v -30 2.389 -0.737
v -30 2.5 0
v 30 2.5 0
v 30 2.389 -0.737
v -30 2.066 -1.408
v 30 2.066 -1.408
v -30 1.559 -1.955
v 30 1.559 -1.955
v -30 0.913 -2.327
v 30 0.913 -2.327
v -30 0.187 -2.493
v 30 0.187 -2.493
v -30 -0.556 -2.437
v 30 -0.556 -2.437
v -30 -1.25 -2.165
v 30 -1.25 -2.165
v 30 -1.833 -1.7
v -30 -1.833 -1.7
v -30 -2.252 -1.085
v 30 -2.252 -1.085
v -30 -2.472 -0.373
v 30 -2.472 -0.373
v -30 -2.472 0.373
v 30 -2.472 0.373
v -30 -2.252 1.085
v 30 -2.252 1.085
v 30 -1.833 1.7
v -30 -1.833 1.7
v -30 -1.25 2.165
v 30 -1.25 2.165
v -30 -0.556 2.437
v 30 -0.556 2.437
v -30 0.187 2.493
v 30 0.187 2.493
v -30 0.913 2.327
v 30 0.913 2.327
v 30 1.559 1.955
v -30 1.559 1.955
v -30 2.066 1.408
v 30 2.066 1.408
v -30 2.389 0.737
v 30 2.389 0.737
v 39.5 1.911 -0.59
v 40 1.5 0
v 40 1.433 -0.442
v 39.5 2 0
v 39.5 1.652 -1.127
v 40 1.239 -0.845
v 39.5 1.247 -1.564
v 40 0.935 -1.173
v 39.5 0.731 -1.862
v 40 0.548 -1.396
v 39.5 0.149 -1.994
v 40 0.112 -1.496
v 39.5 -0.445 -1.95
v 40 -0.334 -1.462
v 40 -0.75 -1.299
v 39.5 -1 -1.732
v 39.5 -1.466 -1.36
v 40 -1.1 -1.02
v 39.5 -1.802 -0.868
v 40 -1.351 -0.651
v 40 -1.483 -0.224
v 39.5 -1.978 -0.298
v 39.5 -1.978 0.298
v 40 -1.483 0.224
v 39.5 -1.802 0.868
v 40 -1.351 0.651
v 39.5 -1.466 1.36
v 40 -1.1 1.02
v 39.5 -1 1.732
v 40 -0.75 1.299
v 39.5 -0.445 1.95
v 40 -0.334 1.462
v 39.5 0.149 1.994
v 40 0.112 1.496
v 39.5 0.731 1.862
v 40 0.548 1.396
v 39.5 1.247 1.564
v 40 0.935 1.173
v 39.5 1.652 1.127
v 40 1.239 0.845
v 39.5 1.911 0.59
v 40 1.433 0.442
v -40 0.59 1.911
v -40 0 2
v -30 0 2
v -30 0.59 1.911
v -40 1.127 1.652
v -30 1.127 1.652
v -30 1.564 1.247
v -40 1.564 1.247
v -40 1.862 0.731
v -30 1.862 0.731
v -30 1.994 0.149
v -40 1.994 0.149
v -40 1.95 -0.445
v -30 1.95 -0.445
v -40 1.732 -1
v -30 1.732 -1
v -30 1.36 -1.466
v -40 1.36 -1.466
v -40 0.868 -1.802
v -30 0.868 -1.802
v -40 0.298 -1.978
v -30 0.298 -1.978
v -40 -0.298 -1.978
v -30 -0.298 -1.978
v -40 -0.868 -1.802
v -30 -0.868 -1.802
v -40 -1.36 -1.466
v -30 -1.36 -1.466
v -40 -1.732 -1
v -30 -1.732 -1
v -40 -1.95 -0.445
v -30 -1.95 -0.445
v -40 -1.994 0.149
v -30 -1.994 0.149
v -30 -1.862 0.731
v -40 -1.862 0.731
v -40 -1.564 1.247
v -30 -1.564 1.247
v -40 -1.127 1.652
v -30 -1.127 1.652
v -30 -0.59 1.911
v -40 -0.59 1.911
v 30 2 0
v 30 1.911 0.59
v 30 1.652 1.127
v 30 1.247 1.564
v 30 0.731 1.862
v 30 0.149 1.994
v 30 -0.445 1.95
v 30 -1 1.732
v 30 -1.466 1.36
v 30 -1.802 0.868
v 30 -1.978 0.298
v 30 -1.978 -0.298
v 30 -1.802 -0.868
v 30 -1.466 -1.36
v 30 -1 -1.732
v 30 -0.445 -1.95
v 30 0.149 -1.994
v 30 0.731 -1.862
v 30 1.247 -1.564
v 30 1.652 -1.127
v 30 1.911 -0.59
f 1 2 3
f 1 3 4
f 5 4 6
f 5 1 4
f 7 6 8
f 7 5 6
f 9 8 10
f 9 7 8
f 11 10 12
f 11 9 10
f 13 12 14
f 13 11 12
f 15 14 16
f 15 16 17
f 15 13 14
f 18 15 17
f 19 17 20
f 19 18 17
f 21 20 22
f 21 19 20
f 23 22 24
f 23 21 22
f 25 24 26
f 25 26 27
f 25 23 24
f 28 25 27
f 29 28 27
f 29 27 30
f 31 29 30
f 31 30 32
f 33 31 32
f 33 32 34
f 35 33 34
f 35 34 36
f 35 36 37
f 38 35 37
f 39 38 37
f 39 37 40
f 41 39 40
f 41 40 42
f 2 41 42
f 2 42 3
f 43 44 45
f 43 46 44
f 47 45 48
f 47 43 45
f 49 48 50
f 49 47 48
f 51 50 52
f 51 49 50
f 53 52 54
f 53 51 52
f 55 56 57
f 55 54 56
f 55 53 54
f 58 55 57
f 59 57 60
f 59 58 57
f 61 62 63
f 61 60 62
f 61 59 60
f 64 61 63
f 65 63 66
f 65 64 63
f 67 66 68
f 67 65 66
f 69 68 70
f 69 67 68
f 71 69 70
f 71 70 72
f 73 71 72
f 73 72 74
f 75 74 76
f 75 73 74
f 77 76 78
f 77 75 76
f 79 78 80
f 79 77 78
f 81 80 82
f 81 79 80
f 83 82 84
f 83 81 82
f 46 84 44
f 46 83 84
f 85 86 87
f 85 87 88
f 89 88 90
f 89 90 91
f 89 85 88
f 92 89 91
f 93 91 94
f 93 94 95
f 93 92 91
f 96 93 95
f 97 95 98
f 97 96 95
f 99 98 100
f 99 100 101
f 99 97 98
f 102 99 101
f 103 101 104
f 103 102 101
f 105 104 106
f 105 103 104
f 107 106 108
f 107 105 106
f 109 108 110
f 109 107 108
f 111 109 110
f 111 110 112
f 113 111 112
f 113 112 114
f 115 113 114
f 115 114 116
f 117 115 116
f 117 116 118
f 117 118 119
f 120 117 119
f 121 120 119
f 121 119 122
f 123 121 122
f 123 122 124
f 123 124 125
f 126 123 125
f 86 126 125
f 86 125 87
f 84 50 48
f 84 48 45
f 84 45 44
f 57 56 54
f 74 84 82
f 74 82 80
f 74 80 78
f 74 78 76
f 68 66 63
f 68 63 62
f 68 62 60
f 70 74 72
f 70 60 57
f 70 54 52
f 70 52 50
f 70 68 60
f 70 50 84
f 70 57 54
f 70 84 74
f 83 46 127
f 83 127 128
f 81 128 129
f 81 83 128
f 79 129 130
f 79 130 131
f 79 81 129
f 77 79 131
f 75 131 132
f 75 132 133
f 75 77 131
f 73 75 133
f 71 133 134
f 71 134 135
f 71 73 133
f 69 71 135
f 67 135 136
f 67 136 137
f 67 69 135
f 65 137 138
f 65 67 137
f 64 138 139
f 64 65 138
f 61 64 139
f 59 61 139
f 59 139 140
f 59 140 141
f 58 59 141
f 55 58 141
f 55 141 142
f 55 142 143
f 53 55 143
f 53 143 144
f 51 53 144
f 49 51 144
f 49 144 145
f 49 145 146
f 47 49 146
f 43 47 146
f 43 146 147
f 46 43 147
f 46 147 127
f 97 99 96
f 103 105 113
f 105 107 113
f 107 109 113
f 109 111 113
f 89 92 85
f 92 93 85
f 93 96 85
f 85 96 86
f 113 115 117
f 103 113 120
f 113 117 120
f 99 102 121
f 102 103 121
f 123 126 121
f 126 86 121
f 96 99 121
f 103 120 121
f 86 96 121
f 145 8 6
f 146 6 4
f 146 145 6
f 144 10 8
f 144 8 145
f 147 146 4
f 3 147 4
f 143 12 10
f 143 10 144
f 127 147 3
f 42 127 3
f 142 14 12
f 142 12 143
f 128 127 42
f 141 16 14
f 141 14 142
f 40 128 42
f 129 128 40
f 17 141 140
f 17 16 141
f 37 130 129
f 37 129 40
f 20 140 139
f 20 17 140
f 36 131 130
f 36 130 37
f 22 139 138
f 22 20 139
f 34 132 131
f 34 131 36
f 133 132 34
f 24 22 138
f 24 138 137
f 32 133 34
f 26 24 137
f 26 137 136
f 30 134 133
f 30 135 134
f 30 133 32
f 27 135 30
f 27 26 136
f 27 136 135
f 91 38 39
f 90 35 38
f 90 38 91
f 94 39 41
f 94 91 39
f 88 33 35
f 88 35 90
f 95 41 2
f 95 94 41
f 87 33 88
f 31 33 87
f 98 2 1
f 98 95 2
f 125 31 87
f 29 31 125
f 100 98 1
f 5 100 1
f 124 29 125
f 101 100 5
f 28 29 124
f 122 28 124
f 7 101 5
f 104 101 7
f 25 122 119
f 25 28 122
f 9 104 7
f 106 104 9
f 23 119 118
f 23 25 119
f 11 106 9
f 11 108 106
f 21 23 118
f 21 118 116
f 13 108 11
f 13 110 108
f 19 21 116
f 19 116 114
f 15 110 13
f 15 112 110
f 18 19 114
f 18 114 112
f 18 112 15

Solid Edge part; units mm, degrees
sketch "Sketch1" plane through (0, 0, 0) normal (1, 0, 0) x (0, 1, 0)
  circle A0 centre (0, 0) radius 2.5
  dimension "D1" = 5
extrude "Protrusion1" add sketch "Sketch1" along normal mid plane 80
sketch "Sketch2" plane through (40, 0, 0) normal (1, 0, 0) x (0, 1, 0)
  circle A0 centre (0, 0) radius 2
  dimension "D1" = 4
extrude "Extrusionsausschnitt_1" cut sketch "Sketch2" against normal blind 10 flip side to cut
cosmetic_thread "Thread1" size "M4"
chamfer "Fase_1" distance 0.5 angle 45 1 edges at (40, -2, 0)
sketch "Sketch3" plane through (-40, 0, 0) normal (-1, 0, 0) x (0, 0, 1)
  circle A0 centre (0, 0) radius 2
  dimension "D1" = 4
extrude "Extrusionsausschnitt_2" cut sketch "Sketch3" against normal blind 10 flip side to cut
cosmetic_thread "Thread2" size "M4"
properties material "Aluminiumlegierung:3.0205, Al 99.0, EN-AW 1200"
